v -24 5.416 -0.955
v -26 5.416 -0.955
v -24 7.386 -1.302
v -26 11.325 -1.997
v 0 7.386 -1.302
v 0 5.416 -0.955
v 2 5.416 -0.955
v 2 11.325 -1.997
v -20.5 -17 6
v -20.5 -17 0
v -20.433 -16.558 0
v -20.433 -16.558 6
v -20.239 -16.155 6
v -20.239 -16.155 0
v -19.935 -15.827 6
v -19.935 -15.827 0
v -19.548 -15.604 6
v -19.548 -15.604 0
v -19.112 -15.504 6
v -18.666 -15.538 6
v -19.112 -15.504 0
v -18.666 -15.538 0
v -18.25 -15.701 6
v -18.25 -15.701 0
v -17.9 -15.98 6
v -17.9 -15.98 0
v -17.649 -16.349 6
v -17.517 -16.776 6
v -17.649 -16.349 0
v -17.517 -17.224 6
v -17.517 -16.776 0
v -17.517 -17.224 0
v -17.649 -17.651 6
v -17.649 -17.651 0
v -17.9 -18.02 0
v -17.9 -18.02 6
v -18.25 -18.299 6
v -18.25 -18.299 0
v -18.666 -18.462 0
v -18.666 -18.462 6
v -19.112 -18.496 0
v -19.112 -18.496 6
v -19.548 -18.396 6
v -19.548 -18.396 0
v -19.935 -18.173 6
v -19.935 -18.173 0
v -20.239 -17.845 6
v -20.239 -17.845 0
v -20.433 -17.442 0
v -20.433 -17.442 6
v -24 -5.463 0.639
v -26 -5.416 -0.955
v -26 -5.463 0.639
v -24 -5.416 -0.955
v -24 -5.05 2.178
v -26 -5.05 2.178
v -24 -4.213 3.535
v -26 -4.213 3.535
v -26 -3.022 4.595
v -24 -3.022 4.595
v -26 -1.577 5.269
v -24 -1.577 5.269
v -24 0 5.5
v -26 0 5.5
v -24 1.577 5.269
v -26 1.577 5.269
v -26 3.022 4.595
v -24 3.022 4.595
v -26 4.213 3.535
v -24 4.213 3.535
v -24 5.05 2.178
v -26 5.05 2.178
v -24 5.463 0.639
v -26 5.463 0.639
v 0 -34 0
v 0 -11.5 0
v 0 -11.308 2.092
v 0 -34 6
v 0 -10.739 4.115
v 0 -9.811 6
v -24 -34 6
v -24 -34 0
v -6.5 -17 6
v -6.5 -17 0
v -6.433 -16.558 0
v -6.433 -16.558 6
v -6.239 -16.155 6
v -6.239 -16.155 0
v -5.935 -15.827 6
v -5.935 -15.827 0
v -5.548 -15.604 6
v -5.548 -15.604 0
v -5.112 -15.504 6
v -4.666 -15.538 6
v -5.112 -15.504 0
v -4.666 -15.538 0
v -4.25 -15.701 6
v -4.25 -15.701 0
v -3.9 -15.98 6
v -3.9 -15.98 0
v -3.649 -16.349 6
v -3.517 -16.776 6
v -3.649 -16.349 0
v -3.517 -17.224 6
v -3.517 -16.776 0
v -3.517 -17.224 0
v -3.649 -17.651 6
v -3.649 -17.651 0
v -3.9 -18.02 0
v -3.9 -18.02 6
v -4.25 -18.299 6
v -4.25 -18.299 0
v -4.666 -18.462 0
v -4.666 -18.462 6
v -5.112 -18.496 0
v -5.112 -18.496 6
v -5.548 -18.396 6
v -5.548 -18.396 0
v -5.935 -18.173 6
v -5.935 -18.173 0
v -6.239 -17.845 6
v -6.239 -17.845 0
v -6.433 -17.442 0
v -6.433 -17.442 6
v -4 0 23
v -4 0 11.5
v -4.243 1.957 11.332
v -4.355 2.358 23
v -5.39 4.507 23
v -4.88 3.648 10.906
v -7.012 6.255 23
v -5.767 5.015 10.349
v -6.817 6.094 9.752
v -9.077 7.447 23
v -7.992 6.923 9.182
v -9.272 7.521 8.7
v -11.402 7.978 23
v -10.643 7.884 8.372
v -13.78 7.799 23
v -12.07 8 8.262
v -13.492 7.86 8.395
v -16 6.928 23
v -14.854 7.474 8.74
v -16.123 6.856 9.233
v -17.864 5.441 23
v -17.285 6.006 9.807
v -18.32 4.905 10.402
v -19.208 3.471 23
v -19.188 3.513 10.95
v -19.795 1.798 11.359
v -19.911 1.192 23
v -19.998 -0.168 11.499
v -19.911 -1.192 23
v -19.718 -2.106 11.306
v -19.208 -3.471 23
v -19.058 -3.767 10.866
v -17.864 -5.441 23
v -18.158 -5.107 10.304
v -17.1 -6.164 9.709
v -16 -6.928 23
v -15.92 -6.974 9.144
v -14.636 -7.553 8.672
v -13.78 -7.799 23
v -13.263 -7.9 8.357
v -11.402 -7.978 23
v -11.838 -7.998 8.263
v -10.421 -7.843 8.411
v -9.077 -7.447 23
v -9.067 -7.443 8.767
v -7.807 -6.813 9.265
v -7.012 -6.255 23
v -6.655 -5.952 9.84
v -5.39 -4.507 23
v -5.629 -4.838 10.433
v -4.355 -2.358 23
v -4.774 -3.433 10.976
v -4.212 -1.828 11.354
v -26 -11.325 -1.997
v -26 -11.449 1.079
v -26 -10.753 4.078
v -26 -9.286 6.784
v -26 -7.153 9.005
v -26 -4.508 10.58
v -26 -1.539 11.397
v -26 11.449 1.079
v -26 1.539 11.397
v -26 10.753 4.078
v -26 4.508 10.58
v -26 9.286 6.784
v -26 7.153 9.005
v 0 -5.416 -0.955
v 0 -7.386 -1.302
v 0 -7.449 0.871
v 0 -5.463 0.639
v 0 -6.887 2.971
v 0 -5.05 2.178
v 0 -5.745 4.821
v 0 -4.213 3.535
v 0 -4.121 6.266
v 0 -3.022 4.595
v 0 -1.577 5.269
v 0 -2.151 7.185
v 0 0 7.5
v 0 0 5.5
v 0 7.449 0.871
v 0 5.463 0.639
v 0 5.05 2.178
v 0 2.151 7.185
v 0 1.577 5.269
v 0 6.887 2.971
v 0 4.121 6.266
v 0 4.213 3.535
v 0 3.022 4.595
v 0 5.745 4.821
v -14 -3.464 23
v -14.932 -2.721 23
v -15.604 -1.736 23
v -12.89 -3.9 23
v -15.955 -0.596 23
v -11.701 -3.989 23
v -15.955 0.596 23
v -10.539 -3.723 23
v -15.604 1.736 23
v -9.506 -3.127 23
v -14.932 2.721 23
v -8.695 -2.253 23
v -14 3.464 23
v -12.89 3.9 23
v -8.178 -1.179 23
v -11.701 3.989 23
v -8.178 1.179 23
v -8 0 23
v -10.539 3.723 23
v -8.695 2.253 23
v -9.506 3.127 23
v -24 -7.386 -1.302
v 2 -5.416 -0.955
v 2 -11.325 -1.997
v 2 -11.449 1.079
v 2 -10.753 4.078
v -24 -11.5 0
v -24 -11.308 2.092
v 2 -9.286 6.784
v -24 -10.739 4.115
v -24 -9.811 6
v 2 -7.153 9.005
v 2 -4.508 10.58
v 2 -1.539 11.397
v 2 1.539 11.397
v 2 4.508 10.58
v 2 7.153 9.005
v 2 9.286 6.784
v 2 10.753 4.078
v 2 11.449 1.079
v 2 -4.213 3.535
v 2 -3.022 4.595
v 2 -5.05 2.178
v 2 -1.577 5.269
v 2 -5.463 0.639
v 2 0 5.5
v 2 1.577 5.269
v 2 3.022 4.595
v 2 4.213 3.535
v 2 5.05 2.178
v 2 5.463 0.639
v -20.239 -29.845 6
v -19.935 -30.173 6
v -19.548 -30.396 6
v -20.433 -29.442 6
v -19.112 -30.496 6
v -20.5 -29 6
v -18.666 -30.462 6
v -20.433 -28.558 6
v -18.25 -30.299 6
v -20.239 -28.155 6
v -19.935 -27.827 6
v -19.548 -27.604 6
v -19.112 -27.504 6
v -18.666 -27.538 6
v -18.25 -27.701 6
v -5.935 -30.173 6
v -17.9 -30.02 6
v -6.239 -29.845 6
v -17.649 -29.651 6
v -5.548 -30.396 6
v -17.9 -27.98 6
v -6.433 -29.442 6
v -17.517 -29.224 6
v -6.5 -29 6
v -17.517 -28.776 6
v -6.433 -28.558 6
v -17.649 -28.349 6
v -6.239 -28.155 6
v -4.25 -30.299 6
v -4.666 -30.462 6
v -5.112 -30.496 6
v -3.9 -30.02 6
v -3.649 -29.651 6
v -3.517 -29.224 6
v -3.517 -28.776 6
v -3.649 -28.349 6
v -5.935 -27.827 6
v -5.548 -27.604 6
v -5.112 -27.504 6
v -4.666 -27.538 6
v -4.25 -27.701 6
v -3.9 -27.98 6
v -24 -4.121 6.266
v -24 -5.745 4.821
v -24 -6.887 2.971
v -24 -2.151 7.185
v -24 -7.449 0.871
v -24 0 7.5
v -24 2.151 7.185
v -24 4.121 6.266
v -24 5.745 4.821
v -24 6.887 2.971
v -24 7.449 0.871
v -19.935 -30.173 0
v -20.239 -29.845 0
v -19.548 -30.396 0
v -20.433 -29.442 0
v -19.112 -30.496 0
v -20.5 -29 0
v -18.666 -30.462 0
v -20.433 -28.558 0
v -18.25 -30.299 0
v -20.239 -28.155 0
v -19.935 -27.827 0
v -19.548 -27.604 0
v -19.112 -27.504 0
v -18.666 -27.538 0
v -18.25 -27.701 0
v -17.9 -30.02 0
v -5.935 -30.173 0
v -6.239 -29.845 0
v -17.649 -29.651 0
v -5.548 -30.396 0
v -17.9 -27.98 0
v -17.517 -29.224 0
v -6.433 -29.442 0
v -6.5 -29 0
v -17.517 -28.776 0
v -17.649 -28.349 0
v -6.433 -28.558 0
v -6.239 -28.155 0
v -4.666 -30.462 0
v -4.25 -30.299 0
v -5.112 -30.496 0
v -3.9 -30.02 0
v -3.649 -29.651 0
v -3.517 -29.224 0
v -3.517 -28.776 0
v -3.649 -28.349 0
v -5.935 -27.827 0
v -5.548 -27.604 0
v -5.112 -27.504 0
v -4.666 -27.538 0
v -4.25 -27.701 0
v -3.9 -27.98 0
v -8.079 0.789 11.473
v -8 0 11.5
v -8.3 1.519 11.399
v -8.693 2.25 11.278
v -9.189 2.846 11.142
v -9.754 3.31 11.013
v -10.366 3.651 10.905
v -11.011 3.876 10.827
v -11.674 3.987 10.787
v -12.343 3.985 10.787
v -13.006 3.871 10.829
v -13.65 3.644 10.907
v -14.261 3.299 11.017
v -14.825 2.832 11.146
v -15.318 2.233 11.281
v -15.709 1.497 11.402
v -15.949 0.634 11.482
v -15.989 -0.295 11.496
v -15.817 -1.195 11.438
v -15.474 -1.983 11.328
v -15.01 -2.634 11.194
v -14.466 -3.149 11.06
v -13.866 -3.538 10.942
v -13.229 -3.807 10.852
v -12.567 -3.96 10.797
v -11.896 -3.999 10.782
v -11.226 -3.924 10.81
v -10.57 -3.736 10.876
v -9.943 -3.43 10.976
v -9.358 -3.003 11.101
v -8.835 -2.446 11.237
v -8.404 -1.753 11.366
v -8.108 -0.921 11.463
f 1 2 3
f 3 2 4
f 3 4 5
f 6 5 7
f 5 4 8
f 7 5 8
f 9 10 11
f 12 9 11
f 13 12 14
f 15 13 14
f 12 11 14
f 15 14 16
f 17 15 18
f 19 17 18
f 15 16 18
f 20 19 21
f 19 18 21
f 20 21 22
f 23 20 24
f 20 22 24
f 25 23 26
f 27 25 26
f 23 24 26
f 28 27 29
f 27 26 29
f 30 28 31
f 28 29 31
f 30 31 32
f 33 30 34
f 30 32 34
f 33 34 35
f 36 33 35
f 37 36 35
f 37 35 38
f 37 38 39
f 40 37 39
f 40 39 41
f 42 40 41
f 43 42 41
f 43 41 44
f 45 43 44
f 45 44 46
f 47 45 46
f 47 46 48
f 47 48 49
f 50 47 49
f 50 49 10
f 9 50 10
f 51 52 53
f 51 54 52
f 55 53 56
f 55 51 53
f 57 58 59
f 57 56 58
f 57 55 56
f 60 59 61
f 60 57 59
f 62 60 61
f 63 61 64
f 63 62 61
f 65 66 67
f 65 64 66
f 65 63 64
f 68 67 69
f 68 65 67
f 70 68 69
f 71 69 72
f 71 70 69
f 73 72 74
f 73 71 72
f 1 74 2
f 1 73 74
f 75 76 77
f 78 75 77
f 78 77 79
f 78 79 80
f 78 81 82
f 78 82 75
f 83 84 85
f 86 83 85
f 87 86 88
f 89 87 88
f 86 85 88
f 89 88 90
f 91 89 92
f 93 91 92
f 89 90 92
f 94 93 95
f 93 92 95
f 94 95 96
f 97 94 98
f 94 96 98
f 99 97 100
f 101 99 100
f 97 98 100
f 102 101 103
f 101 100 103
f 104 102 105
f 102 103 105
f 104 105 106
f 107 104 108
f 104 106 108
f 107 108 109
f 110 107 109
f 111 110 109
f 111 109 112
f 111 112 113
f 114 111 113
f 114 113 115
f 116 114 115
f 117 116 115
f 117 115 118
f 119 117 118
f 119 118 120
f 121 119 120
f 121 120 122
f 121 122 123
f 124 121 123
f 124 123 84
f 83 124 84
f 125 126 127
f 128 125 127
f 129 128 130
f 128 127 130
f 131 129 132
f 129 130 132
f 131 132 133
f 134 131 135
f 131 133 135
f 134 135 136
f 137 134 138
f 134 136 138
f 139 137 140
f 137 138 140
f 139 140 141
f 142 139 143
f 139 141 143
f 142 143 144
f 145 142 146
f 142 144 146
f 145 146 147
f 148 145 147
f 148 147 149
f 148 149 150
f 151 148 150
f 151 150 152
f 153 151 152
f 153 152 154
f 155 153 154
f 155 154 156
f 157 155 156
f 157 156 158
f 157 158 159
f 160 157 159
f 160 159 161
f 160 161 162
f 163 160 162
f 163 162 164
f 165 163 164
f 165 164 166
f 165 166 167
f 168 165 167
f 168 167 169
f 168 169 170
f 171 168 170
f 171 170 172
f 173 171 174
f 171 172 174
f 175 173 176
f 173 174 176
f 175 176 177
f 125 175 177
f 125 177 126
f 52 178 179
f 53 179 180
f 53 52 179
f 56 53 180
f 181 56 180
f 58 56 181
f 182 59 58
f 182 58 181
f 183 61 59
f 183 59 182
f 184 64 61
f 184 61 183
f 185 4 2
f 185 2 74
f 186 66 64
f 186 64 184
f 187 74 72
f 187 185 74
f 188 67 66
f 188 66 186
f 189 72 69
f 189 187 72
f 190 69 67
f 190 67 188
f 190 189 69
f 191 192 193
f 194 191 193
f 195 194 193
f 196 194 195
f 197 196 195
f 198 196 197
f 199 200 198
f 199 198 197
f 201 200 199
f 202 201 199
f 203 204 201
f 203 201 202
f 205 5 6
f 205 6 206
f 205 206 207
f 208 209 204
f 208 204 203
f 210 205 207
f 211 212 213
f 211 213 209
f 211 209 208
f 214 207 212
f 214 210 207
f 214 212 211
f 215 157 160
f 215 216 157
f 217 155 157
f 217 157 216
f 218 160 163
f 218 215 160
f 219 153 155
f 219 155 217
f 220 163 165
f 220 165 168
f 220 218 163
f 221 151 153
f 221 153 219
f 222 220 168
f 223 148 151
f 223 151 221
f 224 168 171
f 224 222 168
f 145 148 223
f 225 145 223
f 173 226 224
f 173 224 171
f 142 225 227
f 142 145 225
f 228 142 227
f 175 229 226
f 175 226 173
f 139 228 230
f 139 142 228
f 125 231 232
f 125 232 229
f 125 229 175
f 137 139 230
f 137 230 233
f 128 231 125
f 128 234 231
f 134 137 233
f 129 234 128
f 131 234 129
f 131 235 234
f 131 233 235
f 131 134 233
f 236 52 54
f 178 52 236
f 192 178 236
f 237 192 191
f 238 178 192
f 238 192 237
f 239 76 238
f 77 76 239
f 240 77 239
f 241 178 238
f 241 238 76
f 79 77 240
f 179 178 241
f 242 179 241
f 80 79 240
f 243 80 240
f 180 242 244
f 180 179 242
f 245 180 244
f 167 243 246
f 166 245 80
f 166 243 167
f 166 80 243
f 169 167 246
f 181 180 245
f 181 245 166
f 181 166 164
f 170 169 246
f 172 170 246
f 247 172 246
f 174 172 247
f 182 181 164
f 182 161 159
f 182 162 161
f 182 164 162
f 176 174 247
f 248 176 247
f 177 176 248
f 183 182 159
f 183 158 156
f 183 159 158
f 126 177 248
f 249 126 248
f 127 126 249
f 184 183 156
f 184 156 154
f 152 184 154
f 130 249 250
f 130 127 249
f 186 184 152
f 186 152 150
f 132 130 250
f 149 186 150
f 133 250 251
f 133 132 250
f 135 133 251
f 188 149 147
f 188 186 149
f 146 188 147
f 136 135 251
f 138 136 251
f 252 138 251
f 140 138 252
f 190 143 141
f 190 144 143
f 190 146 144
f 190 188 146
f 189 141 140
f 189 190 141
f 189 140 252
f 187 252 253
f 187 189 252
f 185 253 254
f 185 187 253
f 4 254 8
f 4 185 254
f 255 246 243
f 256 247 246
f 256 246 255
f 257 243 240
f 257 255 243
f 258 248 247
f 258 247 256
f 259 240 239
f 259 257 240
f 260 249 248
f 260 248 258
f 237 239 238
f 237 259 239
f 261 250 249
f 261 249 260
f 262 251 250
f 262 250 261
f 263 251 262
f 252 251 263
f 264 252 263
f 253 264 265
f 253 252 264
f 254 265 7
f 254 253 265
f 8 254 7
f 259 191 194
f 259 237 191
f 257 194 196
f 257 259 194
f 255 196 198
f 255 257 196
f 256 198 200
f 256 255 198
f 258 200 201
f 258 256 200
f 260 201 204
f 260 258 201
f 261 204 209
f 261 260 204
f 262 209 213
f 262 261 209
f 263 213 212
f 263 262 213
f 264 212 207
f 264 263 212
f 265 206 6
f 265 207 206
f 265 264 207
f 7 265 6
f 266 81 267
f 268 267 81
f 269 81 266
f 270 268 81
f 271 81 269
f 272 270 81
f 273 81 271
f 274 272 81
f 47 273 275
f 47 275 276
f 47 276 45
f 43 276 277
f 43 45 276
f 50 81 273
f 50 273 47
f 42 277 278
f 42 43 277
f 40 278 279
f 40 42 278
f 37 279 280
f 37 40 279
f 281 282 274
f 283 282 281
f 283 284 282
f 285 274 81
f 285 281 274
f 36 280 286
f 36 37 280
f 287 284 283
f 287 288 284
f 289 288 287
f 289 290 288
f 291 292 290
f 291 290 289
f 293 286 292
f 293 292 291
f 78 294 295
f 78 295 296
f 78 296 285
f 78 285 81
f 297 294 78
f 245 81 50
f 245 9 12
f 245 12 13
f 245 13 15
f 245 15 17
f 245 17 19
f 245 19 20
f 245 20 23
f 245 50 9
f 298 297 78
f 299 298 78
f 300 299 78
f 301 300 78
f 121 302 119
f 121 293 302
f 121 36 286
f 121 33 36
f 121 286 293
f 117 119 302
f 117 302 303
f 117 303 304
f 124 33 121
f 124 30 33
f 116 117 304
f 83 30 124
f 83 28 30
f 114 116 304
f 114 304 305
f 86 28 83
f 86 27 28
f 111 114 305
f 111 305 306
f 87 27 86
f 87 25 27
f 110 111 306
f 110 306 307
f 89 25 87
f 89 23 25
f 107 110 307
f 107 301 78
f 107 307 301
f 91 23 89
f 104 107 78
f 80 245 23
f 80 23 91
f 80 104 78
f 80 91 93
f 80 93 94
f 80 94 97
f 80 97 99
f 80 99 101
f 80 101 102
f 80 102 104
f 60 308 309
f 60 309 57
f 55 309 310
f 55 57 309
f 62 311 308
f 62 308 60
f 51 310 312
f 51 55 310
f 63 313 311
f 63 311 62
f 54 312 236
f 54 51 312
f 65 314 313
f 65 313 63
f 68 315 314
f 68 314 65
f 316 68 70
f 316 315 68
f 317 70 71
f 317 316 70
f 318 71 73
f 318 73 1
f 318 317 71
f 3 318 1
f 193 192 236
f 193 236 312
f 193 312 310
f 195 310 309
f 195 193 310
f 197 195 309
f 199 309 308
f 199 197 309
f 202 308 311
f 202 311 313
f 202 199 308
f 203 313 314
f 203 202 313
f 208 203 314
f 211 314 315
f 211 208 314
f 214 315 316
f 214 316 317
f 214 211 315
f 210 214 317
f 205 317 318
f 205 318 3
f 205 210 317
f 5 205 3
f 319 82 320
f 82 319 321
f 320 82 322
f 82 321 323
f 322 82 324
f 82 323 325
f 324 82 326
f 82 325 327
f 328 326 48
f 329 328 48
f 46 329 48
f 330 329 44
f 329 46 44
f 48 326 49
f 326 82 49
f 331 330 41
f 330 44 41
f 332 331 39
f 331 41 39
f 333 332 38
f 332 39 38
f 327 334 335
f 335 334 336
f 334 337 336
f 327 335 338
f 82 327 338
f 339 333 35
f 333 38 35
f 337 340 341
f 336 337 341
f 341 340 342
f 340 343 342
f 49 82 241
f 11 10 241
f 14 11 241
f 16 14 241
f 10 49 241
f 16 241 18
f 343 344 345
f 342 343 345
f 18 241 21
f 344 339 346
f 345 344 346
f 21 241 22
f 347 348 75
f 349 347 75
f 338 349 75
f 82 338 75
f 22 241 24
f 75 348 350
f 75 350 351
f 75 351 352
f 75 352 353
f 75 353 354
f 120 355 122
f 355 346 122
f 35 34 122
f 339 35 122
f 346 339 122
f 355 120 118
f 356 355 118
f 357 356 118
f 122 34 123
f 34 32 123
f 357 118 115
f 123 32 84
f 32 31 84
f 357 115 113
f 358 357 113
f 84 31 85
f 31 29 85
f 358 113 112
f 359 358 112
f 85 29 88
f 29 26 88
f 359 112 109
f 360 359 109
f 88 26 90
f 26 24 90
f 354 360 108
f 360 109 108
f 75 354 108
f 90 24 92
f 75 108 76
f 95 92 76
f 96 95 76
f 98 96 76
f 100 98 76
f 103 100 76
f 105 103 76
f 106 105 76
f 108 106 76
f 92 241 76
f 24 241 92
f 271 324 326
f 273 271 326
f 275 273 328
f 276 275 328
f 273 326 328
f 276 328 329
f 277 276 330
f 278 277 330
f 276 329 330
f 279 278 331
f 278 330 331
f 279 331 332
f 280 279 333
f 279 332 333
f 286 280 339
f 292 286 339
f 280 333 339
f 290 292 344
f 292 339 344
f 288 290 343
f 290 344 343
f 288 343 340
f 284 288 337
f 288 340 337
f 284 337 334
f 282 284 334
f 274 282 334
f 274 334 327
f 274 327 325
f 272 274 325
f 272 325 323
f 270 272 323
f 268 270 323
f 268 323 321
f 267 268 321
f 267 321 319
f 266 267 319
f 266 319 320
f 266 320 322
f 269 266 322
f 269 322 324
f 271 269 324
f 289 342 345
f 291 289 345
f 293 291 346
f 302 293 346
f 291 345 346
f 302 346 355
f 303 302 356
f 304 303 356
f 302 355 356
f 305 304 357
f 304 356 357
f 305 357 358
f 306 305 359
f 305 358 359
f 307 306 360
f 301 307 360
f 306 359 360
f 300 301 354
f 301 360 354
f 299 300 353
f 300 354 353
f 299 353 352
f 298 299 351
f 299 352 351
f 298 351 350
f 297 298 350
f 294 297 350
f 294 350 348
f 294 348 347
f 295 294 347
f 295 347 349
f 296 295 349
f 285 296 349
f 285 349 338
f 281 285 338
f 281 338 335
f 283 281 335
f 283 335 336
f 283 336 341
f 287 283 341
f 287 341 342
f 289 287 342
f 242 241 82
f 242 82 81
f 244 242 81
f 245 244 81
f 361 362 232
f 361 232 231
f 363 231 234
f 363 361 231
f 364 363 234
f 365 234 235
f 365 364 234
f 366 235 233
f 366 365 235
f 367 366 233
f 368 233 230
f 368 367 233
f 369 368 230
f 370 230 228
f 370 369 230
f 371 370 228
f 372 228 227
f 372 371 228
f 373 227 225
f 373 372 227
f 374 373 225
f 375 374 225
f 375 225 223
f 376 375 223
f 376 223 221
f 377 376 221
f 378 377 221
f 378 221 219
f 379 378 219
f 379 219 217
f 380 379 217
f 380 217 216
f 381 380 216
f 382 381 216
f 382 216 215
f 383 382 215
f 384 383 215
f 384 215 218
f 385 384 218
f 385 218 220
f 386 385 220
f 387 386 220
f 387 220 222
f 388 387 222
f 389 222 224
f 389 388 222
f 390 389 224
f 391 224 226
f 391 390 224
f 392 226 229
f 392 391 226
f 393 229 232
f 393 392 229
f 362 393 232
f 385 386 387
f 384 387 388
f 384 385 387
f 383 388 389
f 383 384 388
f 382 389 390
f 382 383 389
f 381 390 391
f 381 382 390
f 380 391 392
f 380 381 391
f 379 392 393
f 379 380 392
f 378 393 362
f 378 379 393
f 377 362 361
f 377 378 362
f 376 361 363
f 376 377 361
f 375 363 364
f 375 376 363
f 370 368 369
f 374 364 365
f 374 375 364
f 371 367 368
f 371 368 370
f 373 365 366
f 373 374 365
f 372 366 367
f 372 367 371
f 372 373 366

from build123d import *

# Parameters (mm, degrees)
F1_ANGLE = 200
F3_R     = 4
F3_R_2   = 8
F4_DEPTH = 15
F6_W     = 24
F6_H     = 6
F7_DEPTH = 25
F9_D     = 3
F9_DEPTH = 10


with BuildPart() as f1:
    # F0 (on Front) → F1 (revolve, symmetric)
    with BuildSketch(Plane.XZ) as f1_sk:
        Polygon((0, 7.5), (0, 5.5), (2, 5.5), (2, 11.5), (-26, 11.5), (-26, 5.5), (-24, 5.5), (-24, 7.5), align=None)
    revolve(axis=Axis((-13.749522, 0, 0), (1, 0, 0)), revolution_arc=F1_ANGLE / 2)
    revolve(f1_sk.sketch, axis=Axis((-13.749522, 0, 0), (-1, 0, 0)), revolution_arc=F1_ANGLE / 2)

    # F3 (on offset) → F4 (join)
    with BuildSketch(Plane.XY.offset(8)):
        with Locations((-12, 0)):
            Circle(F3_R)
        with Locations((-12, 0)):
            Circle(F3_R_2)
        with Locations((-12, 0)):
            Circle(F3_R, mode=Mode.SUBTRACT)
    extrude(amount=F4_DEPTH)

    # F6 (on offset) → F7 (join)
    with BuildSketch(Plane.XZ.offset(9)):
        with Locations((-12, 3)):
            Rectangle(F6_W, F6_H)
    extrude(amount=F7_DEPTH)

    # F9
    with Locations(Plane.XY.offset(6)):
        with Locations((-19, -29), (-5, -29), (-5, -17.000001), (-19, -17.000001)):
            Hole(F9_D / 2, depth=F9_DEPTH)


solid = f1.part
